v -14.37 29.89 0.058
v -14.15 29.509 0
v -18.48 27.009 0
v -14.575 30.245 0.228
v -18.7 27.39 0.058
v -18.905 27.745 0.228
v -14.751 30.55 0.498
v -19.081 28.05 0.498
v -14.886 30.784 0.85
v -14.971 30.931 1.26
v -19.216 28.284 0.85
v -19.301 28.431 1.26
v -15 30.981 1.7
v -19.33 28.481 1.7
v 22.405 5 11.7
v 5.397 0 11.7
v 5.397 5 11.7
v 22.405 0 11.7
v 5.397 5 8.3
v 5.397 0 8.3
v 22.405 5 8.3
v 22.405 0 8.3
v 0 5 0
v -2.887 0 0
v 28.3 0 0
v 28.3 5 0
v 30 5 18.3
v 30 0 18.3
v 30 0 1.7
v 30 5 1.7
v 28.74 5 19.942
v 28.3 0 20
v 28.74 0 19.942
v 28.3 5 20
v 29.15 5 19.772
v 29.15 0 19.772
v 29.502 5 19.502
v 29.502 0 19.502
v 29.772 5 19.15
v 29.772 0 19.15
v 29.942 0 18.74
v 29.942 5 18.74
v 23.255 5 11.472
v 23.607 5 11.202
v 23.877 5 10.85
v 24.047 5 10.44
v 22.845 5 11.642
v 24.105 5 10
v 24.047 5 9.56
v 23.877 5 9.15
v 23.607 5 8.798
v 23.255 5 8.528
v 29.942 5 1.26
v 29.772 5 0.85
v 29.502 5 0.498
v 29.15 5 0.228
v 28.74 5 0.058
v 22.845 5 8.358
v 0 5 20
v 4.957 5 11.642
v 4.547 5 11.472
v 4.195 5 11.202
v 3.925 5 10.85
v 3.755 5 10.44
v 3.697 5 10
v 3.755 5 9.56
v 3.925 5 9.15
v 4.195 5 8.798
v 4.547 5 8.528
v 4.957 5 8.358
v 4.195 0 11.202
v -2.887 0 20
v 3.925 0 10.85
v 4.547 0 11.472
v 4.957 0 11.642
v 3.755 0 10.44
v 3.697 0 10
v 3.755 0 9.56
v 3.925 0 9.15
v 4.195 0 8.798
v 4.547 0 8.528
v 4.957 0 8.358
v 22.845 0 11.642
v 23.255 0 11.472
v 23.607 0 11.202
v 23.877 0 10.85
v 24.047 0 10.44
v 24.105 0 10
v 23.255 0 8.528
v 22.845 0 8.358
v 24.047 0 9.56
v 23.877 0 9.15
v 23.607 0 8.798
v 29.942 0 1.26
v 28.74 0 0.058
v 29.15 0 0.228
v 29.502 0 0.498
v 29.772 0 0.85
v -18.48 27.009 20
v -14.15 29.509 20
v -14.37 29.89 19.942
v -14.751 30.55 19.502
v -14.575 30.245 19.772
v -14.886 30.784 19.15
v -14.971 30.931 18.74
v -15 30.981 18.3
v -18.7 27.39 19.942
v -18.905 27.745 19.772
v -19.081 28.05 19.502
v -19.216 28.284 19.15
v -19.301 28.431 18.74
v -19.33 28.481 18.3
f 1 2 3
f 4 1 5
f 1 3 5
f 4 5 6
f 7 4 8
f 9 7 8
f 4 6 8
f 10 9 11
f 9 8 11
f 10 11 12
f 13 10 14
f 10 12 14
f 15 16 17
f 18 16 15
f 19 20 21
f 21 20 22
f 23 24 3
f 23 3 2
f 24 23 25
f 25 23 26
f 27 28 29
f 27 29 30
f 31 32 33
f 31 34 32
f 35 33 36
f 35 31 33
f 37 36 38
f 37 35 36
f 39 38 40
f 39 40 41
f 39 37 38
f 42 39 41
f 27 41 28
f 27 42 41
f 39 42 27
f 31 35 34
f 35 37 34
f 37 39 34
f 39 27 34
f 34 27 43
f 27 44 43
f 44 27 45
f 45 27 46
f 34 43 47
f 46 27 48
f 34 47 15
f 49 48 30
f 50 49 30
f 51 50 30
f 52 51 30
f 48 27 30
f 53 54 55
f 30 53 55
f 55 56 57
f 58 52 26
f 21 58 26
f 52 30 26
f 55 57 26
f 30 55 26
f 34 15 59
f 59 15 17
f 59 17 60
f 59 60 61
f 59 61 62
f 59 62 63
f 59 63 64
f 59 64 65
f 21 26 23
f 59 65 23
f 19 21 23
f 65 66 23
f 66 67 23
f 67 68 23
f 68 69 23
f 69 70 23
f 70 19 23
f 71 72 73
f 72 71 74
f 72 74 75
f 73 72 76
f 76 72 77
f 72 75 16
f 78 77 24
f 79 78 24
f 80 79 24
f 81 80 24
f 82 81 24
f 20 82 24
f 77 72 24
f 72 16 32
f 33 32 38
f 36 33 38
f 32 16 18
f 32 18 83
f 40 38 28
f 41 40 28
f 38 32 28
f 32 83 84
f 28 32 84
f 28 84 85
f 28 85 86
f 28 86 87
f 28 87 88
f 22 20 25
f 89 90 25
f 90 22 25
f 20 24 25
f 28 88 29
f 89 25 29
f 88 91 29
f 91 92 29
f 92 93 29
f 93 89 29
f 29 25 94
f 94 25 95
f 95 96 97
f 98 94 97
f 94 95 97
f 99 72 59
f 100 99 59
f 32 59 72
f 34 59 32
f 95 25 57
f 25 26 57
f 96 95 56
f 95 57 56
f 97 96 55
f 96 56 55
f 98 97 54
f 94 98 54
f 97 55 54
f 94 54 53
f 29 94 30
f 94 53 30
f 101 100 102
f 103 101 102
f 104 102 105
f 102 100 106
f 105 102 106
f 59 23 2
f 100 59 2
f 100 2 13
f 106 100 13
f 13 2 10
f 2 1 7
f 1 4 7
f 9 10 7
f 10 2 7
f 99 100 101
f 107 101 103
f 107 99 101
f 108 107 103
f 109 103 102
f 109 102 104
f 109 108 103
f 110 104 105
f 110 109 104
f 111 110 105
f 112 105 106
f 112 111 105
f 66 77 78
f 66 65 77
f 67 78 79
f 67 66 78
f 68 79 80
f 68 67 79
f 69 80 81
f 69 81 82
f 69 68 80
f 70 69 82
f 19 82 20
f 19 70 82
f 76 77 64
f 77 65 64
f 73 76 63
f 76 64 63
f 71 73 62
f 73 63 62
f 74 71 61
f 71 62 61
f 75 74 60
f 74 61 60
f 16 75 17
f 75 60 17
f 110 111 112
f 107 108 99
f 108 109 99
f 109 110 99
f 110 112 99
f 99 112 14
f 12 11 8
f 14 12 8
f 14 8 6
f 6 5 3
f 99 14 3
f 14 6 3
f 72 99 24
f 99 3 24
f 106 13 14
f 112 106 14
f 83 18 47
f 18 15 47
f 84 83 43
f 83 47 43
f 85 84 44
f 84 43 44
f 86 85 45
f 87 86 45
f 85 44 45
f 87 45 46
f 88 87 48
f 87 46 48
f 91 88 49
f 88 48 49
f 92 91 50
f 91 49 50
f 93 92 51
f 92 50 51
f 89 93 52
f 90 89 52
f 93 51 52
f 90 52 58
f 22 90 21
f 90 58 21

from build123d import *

# Parameters (mm, degrees)
F1_DEPTH = 20
F2_W     = 20.4075463116
F2_H     = 3.4
F3_DEPTH = 25
F4_R     = 1.69999


# Not quite as in the source:
# - a fillet or chamfer is up to 0.001 mm smaller than in the source, because OpenCascade refuses the exact size


with BuildPart() as f1:
    # F0 (on Top) → F1 (new body)
    with BuildSketch(Plane.XY):
        Polygon((-2.8867513459, 0), (0, 0), (30, 0), (30, 5), (0, 5), (-15, 30.9807621135), (-19.3301270189, 28.4807621135), align=None)
    extrude(amount=F1_DEPTH)

    # F2 (on face) → F3 (cut)
    with BuildSketch(Plane.XZ):
        with Locations((13.9012318105, 10)):
            Rectangle(F2_W, F2_H)
    extrude(amount=-F3_DEPTH, mode=Mode.SUBTRACT)

    # F4 (radius 1.7 in the source; OpenCascade refuses exactly that, so slightly less here)
    f4_edges = [f1.edges().sort_by_distance(p)[0] for p in [
        (3.697459, 2.5, 8.3),
        (3.697459, 2.5, 11.7),
        (24.105005, 2.5, 11.7),
        (24.105005, 2.5, 8.3),
        (30, 2.5, 20),
        (30, 2.5, 0),
        (-17.165064, 29.730762, 20),
        (-17.165064, 29.730762, 0),
    ]]
    fillet(f4_edges, radius=F4_R)


solid = f1.part
